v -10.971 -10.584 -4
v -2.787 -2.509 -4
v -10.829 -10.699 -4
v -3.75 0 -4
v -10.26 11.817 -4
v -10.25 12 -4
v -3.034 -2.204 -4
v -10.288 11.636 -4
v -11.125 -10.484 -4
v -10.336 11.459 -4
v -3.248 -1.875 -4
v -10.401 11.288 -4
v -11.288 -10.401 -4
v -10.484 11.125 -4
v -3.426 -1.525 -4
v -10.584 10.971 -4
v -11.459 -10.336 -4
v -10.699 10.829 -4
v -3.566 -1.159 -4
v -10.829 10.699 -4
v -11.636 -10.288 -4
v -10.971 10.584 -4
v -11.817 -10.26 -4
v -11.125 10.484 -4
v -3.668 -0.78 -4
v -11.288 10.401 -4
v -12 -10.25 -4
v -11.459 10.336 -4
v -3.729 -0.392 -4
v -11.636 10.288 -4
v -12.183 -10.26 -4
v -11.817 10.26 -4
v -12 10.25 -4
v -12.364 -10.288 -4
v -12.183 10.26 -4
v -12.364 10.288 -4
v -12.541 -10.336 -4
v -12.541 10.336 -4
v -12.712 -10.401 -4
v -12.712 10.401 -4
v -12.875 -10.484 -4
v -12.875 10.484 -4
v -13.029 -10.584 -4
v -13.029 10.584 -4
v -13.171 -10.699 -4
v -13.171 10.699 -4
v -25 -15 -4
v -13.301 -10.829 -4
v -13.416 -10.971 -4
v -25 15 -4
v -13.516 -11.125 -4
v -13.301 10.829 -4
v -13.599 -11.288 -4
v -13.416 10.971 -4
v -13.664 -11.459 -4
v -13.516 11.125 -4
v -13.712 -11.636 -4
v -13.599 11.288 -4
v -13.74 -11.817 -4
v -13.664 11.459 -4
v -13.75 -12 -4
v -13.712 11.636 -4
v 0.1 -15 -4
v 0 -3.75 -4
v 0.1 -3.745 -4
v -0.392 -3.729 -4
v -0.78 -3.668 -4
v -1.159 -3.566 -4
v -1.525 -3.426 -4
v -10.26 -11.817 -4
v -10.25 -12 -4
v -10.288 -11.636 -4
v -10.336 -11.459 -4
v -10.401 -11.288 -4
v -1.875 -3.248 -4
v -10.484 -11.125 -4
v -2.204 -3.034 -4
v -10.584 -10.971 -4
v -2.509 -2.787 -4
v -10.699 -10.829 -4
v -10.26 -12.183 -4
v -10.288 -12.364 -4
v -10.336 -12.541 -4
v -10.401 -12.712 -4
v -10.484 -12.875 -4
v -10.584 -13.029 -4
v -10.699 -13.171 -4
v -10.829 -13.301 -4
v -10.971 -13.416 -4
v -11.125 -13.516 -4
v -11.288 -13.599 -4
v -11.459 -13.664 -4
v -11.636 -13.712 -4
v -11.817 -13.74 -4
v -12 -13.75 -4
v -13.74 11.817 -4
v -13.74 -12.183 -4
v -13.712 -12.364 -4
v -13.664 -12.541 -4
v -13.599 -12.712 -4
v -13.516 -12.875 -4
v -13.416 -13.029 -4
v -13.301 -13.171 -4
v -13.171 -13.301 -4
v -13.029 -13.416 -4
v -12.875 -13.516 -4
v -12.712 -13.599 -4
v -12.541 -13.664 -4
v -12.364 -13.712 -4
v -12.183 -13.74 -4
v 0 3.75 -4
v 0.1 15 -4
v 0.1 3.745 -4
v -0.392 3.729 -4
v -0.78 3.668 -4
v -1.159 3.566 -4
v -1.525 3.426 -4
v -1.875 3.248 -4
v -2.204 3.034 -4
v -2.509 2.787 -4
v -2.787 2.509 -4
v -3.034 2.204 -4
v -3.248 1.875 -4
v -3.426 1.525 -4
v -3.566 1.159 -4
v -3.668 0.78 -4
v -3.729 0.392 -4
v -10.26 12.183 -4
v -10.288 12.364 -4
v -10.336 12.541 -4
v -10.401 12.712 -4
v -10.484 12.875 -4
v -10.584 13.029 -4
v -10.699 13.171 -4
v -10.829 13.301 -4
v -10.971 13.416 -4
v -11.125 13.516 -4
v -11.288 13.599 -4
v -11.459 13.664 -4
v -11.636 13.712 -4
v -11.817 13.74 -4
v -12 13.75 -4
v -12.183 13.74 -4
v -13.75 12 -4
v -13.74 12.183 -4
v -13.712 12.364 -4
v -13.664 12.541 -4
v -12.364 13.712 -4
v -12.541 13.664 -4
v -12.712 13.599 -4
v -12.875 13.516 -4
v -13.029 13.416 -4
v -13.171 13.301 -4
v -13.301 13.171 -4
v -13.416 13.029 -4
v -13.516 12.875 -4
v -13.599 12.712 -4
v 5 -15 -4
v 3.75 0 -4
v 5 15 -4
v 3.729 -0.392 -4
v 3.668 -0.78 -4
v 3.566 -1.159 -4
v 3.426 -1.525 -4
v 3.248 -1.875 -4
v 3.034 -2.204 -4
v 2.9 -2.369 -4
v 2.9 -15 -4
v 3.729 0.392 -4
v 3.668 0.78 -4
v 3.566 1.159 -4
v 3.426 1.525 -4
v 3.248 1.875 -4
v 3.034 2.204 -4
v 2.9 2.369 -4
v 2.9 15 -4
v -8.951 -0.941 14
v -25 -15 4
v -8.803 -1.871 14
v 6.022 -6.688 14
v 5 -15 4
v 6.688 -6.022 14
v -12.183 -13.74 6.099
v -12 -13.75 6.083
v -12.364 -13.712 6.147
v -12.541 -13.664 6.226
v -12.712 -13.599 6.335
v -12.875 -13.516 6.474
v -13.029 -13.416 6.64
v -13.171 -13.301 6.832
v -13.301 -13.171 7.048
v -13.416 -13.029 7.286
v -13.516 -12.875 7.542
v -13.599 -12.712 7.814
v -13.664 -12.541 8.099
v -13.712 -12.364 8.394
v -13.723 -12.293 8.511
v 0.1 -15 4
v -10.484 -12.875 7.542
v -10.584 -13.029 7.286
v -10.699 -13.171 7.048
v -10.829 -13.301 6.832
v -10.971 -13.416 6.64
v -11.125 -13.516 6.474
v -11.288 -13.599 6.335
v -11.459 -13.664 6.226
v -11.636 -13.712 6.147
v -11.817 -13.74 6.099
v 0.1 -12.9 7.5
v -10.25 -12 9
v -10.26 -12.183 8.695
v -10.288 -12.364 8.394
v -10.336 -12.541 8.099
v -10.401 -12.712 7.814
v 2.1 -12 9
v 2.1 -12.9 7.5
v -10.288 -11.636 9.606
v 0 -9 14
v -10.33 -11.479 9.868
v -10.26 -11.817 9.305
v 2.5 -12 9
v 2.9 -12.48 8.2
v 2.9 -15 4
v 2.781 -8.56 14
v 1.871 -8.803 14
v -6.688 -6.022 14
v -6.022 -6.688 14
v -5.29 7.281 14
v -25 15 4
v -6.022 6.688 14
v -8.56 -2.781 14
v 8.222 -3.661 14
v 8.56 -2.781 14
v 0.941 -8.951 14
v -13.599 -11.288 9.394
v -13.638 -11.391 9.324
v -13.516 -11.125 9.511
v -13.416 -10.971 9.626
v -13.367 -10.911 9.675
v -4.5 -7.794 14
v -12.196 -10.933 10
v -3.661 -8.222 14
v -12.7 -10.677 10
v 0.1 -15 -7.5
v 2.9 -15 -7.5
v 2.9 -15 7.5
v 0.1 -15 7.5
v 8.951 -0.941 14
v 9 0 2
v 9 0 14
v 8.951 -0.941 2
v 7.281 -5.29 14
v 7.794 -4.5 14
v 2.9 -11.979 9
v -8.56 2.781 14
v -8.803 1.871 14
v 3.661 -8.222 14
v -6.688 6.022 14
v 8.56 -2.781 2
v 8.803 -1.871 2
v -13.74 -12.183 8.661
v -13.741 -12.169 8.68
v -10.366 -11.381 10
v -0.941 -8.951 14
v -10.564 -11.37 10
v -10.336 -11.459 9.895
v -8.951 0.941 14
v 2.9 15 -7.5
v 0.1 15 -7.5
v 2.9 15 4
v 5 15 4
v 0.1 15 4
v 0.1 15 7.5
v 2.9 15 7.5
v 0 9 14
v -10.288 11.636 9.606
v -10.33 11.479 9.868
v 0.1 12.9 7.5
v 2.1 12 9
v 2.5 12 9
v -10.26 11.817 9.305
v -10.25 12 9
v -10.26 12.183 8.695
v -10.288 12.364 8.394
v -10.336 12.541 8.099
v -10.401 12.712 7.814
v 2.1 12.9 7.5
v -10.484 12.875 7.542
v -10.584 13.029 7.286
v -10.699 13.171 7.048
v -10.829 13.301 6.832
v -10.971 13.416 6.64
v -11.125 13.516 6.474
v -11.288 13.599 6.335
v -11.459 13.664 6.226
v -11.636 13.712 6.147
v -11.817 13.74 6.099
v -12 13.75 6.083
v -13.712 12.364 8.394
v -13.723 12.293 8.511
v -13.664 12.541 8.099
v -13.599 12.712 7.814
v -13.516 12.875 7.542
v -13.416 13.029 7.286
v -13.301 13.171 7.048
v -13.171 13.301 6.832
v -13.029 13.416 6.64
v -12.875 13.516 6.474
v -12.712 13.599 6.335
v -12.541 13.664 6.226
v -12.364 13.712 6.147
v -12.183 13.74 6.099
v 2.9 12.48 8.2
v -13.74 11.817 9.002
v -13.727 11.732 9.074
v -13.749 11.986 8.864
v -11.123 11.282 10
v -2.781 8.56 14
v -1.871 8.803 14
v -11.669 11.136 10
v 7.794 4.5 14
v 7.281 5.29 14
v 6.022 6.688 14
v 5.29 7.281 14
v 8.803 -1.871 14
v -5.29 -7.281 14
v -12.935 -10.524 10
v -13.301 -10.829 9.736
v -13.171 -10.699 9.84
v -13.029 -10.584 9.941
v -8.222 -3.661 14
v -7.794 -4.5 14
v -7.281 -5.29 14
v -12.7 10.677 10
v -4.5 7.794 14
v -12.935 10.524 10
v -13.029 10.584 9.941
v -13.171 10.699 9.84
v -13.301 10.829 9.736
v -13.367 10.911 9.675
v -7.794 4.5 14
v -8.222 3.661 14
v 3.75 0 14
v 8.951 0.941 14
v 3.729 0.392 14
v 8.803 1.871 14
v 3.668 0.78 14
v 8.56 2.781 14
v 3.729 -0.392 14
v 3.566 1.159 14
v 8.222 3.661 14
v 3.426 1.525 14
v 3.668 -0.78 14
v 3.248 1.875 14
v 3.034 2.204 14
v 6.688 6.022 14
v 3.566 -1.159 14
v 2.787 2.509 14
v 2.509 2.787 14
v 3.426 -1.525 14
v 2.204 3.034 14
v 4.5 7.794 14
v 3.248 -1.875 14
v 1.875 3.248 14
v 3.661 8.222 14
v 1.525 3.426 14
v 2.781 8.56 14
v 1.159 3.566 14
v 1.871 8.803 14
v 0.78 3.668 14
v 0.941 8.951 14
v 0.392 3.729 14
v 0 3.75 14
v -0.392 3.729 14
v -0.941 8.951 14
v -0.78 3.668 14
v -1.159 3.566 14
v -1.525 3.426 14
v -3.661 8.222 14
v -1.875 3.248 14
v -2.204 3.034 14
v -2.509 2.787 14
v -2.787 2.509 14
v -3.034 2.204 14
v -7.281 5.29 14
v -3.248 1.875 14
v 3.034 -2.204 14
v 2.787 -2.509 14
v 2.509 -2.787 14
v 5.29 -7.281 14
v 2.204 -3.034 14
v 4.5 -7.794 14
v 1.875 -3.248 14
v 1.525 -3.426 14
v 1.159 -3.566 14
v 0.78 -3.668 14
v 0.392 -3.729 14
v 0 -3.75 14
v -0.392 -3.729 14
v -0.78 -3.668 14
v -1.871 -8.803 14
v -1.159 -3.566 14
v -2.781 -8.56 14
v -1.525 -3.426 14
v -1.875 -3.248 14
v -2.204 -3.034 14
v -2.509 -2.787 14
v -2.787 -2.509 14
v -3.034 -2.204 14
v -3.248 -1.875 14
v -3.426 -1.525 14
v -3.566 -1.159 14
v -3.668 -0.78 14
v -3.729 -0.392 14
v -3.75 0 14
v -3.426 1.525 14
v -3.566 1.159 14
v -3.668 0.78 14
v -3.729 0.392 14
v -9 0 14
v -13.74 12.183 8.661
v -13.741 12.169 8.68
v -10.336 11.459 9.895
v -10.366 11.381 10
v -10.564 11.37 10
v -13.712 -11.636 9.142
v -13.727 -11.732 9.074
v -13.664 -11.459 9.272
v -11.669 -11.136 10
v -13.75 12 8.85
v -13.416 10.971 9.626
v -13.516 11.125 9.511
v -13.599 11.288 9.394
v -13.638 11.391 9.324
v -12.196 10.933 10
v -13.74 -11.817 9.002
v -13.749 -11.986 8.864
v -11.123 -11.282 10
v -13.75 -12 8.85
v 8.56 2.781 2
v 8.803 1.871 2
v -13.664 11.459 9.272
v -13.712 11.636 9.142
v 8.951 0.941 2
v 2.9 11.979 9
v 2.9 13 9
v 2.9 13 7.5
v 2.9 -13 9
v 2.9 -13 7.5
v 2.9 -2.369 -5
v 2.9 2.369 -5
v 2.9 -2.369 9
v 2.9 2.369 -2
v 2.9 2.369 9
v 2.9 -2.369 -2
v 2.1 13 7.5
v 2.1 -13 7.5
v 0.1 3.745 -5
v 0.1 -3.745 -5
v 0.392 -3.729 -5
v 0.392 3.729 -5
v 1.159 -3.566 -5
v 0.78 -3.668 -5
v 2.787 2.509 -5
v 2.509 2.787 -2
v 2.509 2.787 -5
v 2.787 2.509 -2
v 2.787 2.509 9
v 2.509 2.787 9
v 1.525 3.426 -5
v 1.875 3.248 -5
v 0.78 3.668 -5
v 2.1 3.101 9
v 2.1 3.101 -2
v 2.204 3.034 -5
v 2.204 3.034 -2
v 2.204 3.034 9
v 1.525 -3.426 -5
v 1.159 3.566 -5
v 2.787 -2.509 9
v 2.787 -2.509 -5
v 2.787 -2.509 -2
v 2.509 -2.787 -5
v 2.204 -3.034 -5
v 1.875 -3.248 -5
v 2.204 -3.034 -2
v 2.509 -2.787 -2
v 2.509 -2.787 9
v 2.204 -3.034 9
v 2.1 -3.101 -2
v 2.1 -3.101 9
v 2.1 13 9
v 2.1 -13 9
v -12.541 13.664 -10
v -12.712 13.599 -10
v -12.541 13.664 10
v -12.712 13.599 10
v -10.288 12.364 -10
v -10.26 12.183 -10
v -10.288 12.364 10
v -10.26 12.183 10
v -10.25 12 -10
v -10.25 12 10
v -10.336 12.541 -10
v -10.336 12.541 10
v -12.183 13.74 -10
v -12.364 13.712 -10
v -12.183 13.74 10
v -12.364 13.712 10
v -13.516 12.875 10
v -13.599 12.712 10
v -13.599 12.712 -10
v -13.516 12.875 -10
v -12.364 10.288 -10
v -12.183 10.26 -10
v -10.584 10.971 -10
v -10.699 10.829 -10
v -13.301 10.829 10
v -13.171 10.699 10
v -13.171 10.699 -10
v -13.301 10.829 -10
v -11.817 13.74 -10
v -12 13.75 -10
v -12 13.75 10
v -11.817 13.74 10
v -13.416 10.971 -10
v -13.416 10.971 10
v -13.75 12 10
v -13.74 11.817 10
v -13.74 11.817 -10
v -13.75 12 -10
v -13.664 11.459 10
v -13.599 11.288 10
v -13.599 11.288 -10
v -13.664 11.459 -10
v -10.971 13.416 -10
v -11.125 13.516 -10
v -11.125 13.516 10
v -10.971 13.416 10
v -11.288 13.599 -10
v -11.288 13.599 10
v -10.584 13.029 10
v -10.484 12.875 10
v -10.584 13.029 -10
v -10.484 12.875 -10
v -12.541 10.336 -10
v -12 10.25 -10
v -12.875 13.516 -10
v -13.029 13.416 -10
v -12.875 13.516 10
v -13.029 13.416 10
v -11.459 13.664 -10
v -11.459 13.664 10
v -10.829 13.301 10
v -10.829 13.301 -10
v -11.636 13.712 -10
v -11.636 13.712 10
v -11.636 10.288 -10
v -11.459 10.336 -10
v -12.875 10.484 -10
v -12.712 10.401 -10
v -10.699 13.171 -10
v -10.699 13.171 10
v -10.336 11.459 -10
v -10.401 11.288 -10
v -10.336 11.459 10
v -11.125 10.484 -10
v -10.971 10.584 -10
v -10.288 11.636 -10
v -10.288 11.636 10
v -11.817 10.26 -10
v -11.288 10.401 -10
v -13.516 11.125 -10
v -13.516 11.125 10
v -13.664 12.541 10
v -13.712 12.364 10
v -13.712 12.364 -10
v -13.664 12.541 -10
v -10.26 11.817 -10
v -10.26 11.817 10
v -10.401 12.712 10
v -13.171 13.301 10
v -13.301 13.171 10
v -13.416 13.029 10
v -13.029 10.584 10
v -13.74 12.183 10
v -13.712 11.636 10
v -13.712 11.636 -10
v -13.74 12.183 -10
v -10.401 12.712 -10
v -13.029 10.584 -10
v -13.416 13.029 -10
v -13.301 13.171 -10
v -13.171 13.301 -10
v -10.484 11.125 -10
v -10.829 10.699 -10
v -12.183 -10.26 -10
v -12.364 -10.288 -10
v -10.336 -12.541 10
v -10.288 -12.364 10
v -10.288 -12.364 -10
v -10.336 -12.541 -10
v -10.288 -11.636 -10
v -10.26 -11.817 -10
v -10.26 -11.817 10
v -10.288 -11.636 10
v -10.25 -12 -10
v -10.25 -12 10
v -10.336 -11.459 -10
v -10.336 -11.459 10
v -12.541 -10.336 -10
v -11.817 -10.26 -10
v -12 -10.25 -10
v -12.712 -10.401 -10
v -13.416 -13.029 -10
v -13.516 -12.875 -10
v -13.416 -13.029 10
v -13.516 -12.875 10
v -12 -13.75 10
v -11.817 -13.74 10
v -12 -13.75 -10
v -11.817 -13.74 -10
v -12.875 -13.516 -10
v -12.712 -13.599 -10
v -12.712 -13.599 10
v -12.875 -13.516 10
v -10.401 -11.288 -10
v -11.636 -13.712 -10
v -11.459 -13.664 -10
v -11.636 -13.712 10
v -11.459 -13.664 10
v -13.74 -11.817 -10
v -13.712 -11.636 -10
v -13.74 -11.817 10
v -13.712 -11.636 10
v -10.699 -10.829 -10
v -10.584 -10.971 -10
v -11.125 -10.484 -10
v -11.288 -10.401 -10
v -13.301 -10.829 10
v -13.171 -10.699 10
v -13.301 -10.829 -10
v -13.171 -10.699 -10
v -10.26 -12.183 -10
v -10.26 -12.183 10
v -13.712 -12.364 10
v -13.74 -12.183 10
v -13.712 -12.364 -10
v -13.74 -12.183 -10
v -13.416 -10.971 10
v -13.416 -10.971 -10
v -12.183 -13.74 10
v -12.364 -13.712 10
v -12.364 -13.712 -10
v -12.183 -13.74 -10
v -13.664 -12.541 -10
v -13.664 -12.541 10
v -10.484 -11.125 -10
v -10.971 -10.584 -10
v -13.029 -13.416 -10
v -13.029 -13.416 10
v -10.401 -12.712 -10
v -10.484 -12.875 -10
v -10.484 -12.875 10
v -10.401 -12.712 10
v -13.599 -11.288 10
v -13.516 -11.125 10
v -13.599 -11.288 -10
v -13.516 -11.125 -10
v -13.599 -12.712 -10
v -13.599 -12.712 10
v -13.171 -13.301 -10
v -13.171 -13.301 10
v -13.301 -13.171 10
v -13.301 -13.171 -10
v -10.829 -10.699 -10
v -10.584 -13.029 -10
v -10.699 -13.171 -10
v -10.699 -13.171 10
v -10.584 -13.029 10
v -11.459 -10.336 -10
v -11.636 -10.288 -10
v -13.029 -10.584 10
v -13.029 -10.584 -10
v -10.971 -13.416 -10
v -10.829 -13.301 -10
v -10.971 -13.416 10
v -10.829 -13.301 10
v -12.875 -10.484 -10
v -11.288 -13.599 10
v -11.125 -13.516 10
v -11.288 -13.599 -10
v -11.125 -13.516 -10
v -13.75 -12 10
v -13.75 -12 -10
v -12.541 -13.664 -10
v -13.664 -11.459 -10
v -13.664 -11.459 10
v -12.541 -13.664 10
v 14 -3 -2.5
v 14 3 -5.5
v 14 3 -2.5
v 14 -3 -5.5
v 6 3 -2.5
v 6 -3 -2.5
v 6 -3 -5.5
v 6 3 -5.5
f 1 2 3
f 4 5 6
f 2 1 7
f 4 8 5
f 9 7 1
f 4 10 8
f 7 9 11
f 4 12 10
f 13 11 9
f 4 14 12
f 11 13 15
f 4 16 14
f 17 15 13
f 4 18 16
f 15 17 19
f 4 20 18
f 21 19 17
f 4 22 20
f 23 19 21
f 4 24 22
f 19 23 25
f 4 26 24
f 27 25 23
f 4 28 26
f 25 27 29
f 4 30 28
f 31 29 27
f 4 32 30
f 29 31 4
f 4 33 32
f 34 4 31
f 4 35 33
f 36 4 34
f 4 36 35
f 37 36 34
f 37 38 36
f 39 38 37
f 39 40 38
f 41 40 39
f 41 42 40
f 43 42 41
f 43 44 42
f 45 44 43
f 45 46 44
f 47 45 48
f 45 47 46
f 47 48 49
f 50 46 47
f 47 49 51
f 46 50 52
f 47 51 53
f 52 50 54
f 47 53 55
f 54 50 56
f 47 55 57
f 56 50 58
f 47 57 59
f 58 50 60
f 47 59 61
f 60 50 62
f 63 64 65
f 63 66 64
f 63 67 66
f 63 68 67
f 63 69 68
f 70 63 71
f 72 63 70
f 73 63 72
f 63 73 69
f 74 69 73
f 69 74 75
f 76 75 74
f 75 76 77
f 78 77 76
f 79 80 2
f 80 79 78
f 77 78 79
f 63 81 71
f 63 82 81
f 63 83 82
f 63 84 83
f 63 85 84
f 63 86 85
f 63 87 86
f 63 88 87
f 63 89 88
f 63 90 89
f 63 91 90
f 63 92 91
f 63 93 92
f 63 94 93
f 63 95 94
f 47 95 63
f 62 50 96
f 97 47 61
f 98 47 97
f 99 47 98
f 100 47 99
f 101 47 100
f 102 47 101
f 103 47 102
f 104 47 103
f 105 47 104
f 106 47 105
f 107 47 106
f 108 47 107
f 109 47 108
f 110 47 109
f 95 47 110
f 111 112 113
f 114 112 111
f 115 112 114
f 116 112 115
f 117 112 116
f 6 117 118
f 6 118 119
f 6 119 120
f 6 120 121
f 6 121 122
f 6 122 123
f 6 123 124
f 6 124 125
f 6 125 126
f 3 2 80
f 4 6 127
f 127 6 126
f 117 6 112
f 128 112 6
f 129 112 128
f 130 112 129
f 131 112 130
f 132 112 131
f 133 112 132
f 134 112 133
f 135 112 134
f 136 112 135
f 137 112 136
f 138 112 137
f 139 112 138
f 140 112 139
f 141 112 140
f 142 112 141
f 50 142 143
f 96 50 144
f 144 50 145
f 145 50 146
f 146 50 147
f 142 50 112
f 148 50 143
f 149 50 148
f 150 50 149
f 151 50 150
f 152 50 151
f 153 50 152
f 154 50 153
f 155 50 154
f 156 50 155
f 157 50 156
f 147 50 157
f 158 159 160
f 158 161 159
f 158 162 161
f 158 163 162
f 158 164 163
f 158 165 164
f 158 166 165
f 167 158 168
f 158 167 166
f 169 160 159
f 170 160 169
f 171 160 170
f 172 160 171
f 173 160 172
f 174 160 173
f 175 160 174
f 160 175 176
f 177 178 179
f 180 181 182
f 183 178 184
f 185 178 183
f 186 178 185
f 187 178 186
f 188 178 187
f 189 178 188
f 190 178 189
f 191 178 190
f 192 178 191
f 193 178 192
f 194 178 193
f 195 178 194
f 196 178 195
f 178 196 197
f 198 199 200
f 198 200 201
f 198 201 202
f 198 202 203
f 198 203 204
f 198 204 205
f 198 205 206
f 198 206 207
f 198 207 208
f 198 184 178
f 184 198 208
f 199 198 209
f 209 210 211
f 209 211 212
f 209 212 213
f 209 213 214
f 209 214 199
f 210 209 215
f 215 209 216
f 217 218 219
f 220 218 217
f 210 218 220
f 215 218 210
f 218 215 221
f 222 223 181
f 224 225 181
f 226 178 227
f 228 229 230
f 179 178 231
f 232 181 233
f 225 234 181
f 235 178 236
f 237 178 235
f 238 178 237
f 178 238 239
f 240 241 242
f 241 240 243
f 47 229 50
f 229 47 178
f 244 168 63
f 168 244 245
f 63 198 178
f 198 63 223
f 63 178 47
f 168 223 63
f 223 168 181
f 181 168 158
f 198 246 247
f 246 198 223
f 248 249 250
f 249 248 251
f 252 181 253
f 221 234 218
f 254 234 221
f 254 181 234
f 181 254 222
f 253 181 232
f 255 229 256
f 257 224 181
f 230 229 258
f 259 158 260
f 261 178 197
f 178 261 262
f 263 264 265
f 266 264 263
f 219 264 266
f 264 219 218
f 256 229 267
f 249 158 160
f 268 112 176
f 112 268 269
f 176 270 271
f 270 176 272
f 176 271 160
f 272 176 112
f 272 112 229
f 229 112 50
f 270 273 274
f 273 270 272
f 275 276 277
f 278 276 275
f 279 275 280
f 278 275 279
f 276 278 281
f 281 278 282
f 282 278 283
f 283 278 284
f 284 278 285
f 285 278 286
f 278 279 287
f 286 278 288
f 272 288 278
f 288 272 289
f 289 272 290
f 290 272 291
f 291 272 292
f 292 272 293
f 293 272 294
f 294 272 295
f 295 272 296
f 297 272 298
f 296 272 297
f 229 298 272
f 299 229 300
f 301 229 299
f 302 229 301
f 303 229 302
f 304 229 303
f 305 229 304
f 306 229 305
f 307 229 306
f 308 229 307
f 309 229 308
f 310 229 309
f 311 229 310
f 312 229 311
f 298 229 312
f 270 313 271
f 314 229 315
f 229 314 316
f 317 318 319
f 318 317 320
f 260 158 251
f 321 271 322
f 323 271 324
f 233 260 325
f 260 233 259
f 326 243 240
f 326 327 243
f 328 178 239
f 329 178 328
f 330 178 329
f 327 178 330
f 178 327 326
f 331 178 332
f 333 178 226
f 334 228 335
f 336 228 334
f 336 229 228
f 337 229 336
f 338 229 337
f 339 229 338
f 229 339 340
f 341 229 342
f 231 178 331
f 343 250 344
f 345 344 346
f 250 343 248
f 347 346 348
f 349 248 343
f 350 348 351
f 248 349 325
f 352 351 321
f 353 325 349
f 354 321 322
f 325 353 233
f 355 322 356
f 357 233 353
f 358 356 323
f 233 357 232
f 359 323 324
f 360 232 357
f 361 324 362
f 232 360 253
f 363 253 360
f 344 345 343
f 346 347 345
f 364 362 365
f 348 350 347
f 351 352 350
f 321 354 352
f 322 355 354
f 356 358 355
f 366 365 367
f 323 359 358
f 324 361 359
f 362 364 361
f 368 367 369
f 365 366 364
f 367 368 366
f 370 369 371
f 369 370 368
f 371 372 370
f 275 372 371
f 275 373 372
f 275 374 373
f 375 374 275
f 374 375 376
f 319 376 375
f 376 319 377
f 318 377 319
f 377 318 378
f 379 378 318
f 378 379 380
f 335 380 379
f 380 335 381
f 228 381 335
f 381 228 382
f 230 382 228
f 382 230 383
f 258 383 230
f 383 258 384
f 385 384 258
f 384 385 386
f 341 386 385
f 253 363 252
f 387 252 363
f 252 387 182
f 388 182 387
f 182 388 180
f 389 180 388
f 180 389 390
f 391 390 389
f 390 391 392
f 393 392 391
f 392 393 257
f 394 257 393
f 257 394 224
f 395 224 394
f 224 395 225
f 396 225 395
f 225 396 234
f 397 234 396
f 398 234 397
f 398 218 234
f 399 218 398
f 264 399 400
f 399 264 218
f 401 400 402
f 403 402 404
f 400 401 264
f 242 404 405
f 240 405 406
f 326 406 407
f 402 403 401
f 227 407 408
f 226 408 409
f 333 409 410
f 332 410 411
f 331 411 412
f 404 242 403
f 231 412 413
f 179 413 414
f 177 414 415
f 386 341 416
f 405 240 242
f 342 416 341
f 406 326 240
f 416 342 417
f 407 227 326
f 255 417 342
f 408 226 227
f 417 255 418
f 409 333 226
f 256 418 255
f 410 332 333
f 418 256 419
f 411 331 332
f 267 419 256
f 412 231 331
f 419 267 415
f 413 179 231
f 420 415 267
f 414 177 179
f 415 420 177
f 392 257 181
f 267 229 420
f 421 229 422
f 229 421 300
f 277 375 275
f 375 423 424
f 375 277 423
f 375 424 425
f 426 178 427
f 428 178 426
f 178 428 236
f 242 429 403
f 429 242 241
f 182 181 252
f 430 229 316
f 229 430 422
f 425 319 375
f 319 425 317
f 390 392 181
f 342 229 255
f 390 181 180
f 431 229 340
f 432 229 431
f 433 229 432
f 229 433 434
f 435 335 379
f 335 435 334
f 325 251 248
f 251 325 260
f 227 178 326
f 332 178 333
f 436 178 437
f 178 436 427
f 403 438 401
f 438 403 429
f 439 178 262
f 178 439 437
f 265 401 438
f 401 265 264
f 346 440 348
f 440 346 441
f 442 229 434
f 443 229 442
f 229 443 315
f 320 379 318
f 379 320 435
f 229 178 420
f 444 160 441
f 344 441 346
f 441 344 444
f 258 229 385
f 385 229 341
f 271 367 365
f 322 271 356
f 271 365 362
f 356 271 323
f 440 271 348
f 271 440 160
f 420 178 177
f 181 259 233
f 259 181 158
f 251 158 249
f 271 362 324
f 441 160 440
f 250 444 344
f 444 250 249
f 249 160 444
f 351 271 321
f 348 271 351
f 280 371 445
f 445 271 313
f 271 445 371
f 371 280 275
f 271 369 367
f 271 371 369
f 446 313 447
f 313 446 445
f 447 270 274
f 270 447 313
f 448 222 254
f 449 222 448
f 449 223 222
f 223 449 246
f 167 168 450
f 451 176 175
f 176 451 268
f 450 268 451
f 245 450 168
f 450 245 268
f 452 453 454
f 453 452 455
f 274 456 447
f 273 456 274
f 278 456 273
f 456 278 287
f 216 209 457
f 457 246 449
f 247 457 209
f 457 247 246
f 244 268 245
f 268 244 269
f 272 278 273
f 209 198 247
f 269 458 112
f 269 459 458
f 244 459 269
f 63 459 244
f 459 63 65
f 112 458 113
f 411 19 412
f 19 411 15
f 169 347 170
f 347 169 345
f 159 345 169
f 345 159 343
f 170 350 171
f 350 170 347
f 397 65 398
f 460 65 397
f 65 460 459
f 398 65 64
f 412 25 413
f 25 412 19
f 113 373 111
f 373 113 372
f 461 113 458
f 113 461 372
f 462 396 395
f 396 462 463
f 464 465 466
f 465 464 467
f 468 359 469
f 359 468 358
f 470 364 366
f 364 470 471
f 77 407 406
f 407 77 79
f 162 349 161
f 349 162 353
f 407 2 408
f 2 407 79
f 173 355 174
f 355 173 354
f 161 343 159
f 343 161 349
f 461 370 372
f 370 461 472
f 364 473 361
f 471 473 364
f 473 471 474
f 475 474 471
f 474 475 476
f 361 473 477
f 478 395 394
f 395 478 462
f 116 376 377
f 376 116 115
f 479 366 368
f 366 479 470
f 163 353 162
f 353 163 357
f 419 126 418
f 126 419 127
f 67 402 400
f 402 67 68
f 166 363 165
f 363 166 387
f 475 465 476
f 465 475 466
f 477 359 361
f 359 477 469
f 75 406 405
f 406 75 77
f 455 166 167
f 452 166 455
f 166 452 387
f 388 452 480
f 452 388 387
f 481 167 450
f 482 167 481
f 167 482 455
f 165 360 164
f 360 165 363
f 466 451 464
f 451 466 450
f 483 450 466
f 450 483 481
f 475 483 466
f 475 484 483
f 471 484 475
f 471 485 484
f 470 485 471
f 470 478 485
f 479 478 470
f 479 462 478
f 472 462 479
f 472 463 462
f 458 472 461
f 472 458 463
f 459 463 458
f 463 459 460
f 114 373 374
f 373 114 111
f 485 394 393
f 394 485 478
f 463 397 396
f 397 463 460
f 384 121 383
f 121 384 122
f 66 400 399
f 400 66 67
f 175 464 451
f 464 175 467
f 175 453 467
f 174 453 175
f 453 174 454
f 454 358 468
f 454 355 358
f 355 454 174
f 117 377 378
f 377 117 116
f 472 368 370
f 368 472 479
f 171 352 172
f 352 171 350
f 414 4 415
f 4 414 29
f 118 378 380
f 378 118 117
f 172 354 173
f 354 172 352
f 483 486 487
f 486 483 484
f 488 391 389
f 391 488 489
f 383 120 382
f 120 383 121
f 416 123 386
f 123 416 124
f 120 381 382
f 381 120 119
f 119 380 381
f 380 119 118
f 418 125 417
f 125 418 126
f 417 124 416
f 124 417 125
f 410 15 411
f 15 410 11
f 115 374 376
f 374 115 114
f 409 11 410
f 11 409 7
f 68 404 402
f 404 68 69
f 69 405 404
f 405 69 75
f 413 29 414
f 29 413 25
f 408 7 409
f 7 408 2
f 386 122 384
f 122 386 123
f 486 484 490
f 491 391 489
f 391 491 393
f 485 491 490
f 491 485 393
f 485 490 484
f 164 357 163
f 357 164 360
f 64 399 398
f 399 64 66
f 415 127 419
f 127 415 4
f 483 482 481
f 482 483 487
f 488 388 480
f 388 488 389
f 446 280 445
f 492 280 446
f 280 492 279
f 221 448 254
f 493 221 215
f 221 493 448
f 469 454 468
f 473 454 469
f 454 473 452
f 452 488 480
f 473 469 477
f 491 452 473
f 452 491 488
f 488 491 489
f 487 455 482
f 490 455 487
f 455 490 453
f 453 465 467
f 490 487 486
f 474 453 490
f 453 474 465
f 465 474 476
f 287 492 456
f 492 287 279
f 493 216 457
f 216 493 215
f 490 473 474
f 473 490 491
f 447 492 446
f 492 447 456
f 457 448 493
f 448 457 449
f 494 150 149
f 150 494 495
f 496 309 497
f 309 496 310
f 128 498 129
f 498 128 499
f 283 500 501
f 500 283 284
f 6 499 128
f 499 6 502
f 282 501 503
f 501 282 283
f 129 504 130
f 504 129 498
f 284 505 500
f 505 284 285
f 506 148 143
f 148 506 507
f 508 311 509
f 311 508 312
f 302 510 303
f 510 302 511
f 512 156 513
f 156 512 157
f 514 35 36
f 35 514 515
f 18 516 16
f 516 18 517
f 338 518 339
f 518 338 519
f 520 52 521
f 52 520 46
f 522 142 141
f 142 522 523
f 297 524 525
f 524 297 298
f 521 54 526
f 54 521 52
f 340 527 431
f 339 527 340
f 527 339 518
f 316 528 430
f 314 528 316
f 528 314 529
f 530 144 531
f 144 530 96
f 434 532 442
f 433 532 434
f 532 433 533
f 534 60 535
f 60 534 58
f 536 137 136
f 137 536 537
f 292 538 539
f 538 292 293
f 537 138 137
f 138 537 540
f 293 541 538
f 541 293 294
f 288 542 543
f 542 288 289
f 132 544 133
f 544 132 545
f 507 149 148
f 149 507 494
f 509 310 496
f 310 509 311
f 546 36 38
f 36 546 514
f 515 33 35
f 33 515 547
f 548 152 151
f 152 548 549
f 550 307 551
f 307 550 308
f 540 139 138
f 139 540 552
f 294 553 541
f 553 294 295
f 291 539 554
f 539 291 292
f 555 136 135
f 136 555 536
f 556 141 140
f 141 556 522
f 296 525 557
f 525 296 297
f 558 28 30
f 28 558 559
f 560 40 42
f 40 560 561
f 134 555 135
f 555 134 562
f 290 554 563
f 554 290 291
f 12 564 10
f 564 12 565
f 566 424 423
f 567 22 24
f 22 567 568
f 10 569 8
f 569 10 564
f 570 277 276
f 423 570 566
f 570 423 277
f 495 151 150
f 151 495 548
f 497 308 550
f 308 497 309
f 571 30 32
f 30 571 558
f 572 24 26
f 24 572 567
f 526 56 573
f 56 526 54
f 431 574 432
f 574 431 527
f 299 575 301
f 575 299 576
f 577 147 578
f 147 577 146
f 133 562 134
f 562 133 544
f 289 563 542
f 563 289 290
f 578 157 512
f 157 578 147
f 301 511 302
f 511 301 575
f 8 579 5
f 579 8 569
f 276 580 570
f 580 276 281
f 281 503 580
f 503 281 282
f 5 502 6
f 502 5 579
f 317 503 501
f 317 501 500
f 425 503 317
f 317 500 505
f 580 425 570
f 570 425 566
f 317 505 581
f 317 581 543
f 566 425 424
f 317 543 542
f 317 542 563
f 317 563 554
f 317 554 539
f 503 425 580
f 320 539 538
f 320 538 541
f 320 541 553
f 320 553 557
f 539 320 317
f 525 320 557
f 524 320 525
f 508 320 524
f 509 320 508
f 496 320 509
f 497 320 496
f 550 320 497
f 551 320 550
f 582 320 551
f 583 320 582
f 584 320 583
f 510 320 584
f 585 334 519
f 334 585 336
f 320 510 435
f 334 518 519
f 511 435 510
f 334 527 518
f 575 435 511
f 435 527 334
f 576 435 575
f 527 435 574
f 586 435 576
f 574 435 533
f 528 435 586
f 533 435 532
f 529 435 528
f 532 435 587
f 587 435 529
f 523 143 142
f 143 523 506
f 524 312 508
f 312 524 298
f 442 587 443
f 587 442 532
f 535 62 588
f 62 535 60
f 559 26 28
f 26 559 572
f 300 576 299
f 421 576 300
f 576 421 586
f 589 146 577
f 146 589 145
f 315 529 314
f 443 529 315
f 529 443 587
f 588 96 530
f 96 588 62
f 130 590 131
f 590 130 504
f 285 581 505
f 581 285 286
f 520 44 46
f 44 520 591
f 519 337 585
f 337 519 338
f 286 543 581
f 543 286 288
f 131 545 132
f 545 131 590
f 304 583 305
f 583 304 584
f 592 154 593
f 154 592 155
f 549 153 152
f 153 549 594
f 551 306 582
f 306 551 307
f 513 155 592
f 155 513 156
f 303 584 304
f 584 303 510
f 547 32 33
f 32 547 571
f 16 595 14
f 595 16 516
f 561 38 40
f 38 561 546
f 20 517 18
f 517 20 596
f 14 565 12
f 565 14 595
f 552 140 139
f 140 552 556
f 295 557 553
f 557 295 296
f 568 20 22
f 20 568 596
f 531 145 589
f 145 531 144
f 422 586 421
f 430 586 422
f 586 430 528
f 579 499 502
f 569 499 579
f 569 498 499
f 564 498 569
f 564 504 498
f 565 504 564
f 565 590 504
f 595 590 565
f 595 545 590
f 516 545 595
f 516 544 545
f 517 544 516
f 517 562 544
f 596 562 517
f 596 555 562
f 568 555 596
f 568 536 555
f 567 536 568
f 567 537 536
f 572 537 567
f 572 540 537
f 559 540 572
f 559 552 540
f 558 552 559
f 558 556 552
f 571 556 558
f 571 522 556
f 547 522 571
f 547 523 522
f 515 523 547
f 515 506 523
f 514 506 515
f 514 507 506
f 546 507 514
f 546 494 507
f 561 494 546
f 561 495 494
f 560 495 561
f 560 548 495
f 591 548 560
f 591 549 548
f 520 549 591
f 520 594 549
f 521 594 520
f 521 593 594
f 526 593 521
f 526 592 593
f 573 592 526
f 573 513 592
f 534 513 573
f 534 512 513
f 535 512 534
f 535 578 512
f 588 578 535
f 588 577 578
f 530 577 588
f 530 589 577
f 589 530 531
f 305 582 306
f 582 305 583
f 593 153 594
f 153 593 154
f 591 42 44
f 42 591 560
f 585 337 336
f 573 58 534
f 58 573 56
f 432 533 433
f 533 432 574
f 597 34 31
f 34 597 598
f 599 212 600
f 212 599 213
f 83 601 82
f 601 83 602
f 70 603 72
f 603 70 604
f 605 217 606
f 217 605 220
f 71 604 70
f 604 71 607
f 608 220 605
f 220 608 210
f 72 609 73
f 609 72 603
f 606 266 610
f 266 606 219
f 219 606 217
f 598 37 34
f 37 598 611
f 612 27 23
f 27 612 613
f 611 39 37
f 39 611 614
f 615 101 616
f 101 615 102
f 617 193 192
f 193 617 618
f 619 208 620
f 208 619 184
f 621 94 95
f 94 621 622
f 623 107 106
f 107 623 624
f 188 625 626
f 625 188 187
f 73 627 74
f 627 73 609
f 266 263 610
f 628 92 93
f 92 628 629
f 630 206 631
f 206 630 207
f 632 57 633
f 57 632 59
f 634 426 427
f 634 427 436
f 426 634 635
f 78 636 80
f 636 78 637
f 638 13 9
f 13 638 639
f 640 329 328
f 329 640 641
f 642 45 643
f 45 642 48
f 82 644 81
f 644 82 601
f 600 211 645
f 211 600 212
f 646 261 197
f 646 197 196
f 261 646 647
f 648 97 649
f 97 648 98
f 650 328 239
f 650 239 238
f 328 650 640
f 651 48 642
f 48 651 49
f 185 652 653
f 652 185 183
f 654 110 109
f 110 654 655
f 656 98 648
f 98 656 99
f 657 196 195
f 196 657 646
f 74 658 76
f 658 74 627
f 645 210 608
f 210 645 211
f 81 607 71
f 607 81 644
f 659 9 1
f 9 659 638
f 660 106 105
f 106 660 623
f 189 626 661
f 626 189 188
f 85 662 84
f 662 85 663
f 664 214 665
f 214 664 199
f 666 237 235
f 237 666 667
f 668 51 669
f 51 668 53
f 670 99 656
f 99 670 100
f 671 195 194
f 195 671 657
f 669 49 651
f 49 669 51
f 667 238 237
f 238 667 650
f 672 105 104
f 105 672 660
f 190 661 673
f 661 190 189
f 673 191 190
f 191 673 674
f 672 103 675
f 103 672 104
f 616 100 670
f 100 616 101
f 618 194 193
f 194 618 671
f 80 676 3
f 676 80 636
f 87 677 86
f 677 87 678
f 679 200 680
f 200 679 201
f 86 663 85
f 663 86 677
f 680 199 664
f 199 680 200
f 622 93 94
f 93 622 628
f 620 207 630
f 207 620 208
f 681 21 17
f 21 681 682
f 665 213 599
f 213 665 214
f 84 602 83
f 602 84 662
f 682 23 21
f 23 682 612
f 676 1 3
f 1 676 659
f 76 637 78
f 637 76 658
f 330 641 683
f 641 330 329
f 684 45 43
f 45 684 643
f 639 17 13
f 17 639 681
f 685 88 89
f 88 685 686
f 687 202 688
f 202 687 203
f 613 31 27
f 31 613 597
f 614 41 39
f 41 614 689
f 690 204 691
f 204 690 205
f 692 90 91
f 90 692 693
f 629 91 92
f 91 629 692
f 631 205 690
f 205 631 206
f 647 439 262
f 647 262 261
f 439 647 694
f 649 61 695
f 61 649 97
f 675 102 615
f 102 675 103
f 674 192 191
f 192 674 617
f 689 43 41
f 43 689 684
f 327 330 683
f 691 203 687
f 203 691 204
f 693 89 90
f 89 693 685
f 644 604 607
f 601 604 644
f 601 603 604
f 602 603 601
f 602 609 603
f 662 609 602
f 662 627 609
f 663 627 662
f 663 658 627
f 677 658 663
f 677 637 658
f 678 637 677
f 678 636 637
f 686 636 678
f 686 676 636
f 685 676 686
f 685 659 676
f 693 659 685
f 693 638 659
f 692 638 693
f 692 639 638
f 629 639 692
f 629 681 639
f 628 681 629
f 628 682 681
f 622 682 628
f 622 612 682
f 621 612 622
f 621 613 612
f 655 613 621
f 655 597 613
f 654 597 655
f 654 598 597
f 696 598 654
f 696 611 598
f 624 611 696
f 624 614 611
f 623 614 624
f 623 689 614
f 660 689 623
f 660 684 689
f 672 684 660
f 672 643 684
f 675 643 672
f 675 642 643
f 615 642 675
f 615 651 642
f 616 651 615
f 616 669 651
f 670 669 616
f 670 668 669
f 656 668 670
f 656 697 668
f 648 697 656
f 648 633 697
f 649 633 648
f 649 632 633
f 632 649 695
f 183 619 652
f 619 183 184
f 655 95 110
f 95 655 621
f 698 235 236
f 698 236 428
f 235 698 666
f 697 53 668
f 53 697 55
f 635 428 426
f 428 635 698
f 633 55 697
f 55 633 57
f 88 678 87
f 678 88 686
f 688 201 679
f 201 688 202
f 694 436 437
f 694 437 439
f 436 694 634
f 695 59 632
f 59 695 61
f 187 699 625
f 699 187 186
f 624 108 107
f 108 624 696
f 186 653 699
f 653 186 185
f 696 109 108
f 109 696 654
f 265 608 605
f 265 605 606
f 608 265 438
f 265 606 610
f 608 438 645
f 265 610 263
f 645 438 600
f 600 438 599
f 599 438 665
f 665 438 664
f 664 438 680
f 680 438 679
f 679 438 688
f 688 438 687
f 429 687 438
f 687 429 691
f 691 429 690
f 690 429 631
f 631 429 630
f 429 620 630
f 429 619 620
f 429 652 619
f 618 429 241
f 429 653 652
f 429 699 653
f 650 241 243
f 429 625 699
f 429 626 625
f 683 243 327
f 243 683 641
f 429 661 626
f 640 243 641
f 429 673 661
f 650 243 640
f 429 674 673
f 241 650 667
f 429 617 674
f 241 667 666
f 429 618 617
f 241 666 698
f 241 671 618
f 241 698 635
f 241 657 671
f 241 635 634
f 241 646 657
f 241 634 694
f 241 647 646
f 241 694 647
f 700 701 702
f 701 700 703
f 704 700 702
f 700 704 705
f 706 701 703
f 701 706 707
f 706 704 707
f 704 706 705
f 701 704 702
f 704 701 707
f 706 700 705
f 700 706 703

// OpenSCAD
// =============================================
// Nanosolar TPU Blade + 18G Luer Lock Holder
// For Treela Luer Lock tips
// Print in TPU (85A-95A) for flexibility
// =============================================

$fn = 60;

// ============= PARAMETERS =============
luer_outer_dia = 7.5;     // Treela Luer lock outer diameter (adjust if needed)
luer_length = 12;         // How much of the tip you want gripped
blade_width = 30;         // Width of the spreading blade
blade_thickness = 0.8;    // Thin flexible edge (TPU)
blade_height = 15;        // How tall the blade is
blade_offset = 1.5;       // Distance behind nozzle tip
gap_adjust = 0.2;         // Extra clearance for blade flex

// ============= MAIN MODULE =============
difference() {
    union() {
        // Main body
        hull() {
            translate([0,0,8]) cylinder(d=18, h=12, center=true);
            translate([-10,0,0]) cube([30, blade_width, 8], center=true);
        }
        
        // Blade holder
        translate([blade_offset, 0, 0])
            cube([blade_thickness+2, blade_width, blade_height], center=true);
    }
    
    // Luer Lock hole (female)
    translate([0,0,5]) cylinder(d=luer_outer_dia, h=20, center=true);
    // Luer lock thread grip (simple friction)
    translate([0,0,10]) cylinder(d=luer_outer_dia-1.5, h=10, center=true);
}

// Flexible blade slot
translate([blade_offset+1, 0, blade_height/2 - 4])
    cube([blade_thickness, blade_width-4, blade_height-4], center=true);

// Mounting holes (adjust to your tool head)
translate([-12, 12, 0]) cylinder(d=3.5, h=20, center=true);  // M3 holes
translate([-12, -12, 0]) cylinder(d=3.5, h=20, center=true);

// Optional alignment tab
translate([10, 0, -4]) cube([8, 6, 3], center=true);

echo("Print in TPU 85A-95A");
echo("Blade gap controlled by Z-height (start at 150-250µm)");
